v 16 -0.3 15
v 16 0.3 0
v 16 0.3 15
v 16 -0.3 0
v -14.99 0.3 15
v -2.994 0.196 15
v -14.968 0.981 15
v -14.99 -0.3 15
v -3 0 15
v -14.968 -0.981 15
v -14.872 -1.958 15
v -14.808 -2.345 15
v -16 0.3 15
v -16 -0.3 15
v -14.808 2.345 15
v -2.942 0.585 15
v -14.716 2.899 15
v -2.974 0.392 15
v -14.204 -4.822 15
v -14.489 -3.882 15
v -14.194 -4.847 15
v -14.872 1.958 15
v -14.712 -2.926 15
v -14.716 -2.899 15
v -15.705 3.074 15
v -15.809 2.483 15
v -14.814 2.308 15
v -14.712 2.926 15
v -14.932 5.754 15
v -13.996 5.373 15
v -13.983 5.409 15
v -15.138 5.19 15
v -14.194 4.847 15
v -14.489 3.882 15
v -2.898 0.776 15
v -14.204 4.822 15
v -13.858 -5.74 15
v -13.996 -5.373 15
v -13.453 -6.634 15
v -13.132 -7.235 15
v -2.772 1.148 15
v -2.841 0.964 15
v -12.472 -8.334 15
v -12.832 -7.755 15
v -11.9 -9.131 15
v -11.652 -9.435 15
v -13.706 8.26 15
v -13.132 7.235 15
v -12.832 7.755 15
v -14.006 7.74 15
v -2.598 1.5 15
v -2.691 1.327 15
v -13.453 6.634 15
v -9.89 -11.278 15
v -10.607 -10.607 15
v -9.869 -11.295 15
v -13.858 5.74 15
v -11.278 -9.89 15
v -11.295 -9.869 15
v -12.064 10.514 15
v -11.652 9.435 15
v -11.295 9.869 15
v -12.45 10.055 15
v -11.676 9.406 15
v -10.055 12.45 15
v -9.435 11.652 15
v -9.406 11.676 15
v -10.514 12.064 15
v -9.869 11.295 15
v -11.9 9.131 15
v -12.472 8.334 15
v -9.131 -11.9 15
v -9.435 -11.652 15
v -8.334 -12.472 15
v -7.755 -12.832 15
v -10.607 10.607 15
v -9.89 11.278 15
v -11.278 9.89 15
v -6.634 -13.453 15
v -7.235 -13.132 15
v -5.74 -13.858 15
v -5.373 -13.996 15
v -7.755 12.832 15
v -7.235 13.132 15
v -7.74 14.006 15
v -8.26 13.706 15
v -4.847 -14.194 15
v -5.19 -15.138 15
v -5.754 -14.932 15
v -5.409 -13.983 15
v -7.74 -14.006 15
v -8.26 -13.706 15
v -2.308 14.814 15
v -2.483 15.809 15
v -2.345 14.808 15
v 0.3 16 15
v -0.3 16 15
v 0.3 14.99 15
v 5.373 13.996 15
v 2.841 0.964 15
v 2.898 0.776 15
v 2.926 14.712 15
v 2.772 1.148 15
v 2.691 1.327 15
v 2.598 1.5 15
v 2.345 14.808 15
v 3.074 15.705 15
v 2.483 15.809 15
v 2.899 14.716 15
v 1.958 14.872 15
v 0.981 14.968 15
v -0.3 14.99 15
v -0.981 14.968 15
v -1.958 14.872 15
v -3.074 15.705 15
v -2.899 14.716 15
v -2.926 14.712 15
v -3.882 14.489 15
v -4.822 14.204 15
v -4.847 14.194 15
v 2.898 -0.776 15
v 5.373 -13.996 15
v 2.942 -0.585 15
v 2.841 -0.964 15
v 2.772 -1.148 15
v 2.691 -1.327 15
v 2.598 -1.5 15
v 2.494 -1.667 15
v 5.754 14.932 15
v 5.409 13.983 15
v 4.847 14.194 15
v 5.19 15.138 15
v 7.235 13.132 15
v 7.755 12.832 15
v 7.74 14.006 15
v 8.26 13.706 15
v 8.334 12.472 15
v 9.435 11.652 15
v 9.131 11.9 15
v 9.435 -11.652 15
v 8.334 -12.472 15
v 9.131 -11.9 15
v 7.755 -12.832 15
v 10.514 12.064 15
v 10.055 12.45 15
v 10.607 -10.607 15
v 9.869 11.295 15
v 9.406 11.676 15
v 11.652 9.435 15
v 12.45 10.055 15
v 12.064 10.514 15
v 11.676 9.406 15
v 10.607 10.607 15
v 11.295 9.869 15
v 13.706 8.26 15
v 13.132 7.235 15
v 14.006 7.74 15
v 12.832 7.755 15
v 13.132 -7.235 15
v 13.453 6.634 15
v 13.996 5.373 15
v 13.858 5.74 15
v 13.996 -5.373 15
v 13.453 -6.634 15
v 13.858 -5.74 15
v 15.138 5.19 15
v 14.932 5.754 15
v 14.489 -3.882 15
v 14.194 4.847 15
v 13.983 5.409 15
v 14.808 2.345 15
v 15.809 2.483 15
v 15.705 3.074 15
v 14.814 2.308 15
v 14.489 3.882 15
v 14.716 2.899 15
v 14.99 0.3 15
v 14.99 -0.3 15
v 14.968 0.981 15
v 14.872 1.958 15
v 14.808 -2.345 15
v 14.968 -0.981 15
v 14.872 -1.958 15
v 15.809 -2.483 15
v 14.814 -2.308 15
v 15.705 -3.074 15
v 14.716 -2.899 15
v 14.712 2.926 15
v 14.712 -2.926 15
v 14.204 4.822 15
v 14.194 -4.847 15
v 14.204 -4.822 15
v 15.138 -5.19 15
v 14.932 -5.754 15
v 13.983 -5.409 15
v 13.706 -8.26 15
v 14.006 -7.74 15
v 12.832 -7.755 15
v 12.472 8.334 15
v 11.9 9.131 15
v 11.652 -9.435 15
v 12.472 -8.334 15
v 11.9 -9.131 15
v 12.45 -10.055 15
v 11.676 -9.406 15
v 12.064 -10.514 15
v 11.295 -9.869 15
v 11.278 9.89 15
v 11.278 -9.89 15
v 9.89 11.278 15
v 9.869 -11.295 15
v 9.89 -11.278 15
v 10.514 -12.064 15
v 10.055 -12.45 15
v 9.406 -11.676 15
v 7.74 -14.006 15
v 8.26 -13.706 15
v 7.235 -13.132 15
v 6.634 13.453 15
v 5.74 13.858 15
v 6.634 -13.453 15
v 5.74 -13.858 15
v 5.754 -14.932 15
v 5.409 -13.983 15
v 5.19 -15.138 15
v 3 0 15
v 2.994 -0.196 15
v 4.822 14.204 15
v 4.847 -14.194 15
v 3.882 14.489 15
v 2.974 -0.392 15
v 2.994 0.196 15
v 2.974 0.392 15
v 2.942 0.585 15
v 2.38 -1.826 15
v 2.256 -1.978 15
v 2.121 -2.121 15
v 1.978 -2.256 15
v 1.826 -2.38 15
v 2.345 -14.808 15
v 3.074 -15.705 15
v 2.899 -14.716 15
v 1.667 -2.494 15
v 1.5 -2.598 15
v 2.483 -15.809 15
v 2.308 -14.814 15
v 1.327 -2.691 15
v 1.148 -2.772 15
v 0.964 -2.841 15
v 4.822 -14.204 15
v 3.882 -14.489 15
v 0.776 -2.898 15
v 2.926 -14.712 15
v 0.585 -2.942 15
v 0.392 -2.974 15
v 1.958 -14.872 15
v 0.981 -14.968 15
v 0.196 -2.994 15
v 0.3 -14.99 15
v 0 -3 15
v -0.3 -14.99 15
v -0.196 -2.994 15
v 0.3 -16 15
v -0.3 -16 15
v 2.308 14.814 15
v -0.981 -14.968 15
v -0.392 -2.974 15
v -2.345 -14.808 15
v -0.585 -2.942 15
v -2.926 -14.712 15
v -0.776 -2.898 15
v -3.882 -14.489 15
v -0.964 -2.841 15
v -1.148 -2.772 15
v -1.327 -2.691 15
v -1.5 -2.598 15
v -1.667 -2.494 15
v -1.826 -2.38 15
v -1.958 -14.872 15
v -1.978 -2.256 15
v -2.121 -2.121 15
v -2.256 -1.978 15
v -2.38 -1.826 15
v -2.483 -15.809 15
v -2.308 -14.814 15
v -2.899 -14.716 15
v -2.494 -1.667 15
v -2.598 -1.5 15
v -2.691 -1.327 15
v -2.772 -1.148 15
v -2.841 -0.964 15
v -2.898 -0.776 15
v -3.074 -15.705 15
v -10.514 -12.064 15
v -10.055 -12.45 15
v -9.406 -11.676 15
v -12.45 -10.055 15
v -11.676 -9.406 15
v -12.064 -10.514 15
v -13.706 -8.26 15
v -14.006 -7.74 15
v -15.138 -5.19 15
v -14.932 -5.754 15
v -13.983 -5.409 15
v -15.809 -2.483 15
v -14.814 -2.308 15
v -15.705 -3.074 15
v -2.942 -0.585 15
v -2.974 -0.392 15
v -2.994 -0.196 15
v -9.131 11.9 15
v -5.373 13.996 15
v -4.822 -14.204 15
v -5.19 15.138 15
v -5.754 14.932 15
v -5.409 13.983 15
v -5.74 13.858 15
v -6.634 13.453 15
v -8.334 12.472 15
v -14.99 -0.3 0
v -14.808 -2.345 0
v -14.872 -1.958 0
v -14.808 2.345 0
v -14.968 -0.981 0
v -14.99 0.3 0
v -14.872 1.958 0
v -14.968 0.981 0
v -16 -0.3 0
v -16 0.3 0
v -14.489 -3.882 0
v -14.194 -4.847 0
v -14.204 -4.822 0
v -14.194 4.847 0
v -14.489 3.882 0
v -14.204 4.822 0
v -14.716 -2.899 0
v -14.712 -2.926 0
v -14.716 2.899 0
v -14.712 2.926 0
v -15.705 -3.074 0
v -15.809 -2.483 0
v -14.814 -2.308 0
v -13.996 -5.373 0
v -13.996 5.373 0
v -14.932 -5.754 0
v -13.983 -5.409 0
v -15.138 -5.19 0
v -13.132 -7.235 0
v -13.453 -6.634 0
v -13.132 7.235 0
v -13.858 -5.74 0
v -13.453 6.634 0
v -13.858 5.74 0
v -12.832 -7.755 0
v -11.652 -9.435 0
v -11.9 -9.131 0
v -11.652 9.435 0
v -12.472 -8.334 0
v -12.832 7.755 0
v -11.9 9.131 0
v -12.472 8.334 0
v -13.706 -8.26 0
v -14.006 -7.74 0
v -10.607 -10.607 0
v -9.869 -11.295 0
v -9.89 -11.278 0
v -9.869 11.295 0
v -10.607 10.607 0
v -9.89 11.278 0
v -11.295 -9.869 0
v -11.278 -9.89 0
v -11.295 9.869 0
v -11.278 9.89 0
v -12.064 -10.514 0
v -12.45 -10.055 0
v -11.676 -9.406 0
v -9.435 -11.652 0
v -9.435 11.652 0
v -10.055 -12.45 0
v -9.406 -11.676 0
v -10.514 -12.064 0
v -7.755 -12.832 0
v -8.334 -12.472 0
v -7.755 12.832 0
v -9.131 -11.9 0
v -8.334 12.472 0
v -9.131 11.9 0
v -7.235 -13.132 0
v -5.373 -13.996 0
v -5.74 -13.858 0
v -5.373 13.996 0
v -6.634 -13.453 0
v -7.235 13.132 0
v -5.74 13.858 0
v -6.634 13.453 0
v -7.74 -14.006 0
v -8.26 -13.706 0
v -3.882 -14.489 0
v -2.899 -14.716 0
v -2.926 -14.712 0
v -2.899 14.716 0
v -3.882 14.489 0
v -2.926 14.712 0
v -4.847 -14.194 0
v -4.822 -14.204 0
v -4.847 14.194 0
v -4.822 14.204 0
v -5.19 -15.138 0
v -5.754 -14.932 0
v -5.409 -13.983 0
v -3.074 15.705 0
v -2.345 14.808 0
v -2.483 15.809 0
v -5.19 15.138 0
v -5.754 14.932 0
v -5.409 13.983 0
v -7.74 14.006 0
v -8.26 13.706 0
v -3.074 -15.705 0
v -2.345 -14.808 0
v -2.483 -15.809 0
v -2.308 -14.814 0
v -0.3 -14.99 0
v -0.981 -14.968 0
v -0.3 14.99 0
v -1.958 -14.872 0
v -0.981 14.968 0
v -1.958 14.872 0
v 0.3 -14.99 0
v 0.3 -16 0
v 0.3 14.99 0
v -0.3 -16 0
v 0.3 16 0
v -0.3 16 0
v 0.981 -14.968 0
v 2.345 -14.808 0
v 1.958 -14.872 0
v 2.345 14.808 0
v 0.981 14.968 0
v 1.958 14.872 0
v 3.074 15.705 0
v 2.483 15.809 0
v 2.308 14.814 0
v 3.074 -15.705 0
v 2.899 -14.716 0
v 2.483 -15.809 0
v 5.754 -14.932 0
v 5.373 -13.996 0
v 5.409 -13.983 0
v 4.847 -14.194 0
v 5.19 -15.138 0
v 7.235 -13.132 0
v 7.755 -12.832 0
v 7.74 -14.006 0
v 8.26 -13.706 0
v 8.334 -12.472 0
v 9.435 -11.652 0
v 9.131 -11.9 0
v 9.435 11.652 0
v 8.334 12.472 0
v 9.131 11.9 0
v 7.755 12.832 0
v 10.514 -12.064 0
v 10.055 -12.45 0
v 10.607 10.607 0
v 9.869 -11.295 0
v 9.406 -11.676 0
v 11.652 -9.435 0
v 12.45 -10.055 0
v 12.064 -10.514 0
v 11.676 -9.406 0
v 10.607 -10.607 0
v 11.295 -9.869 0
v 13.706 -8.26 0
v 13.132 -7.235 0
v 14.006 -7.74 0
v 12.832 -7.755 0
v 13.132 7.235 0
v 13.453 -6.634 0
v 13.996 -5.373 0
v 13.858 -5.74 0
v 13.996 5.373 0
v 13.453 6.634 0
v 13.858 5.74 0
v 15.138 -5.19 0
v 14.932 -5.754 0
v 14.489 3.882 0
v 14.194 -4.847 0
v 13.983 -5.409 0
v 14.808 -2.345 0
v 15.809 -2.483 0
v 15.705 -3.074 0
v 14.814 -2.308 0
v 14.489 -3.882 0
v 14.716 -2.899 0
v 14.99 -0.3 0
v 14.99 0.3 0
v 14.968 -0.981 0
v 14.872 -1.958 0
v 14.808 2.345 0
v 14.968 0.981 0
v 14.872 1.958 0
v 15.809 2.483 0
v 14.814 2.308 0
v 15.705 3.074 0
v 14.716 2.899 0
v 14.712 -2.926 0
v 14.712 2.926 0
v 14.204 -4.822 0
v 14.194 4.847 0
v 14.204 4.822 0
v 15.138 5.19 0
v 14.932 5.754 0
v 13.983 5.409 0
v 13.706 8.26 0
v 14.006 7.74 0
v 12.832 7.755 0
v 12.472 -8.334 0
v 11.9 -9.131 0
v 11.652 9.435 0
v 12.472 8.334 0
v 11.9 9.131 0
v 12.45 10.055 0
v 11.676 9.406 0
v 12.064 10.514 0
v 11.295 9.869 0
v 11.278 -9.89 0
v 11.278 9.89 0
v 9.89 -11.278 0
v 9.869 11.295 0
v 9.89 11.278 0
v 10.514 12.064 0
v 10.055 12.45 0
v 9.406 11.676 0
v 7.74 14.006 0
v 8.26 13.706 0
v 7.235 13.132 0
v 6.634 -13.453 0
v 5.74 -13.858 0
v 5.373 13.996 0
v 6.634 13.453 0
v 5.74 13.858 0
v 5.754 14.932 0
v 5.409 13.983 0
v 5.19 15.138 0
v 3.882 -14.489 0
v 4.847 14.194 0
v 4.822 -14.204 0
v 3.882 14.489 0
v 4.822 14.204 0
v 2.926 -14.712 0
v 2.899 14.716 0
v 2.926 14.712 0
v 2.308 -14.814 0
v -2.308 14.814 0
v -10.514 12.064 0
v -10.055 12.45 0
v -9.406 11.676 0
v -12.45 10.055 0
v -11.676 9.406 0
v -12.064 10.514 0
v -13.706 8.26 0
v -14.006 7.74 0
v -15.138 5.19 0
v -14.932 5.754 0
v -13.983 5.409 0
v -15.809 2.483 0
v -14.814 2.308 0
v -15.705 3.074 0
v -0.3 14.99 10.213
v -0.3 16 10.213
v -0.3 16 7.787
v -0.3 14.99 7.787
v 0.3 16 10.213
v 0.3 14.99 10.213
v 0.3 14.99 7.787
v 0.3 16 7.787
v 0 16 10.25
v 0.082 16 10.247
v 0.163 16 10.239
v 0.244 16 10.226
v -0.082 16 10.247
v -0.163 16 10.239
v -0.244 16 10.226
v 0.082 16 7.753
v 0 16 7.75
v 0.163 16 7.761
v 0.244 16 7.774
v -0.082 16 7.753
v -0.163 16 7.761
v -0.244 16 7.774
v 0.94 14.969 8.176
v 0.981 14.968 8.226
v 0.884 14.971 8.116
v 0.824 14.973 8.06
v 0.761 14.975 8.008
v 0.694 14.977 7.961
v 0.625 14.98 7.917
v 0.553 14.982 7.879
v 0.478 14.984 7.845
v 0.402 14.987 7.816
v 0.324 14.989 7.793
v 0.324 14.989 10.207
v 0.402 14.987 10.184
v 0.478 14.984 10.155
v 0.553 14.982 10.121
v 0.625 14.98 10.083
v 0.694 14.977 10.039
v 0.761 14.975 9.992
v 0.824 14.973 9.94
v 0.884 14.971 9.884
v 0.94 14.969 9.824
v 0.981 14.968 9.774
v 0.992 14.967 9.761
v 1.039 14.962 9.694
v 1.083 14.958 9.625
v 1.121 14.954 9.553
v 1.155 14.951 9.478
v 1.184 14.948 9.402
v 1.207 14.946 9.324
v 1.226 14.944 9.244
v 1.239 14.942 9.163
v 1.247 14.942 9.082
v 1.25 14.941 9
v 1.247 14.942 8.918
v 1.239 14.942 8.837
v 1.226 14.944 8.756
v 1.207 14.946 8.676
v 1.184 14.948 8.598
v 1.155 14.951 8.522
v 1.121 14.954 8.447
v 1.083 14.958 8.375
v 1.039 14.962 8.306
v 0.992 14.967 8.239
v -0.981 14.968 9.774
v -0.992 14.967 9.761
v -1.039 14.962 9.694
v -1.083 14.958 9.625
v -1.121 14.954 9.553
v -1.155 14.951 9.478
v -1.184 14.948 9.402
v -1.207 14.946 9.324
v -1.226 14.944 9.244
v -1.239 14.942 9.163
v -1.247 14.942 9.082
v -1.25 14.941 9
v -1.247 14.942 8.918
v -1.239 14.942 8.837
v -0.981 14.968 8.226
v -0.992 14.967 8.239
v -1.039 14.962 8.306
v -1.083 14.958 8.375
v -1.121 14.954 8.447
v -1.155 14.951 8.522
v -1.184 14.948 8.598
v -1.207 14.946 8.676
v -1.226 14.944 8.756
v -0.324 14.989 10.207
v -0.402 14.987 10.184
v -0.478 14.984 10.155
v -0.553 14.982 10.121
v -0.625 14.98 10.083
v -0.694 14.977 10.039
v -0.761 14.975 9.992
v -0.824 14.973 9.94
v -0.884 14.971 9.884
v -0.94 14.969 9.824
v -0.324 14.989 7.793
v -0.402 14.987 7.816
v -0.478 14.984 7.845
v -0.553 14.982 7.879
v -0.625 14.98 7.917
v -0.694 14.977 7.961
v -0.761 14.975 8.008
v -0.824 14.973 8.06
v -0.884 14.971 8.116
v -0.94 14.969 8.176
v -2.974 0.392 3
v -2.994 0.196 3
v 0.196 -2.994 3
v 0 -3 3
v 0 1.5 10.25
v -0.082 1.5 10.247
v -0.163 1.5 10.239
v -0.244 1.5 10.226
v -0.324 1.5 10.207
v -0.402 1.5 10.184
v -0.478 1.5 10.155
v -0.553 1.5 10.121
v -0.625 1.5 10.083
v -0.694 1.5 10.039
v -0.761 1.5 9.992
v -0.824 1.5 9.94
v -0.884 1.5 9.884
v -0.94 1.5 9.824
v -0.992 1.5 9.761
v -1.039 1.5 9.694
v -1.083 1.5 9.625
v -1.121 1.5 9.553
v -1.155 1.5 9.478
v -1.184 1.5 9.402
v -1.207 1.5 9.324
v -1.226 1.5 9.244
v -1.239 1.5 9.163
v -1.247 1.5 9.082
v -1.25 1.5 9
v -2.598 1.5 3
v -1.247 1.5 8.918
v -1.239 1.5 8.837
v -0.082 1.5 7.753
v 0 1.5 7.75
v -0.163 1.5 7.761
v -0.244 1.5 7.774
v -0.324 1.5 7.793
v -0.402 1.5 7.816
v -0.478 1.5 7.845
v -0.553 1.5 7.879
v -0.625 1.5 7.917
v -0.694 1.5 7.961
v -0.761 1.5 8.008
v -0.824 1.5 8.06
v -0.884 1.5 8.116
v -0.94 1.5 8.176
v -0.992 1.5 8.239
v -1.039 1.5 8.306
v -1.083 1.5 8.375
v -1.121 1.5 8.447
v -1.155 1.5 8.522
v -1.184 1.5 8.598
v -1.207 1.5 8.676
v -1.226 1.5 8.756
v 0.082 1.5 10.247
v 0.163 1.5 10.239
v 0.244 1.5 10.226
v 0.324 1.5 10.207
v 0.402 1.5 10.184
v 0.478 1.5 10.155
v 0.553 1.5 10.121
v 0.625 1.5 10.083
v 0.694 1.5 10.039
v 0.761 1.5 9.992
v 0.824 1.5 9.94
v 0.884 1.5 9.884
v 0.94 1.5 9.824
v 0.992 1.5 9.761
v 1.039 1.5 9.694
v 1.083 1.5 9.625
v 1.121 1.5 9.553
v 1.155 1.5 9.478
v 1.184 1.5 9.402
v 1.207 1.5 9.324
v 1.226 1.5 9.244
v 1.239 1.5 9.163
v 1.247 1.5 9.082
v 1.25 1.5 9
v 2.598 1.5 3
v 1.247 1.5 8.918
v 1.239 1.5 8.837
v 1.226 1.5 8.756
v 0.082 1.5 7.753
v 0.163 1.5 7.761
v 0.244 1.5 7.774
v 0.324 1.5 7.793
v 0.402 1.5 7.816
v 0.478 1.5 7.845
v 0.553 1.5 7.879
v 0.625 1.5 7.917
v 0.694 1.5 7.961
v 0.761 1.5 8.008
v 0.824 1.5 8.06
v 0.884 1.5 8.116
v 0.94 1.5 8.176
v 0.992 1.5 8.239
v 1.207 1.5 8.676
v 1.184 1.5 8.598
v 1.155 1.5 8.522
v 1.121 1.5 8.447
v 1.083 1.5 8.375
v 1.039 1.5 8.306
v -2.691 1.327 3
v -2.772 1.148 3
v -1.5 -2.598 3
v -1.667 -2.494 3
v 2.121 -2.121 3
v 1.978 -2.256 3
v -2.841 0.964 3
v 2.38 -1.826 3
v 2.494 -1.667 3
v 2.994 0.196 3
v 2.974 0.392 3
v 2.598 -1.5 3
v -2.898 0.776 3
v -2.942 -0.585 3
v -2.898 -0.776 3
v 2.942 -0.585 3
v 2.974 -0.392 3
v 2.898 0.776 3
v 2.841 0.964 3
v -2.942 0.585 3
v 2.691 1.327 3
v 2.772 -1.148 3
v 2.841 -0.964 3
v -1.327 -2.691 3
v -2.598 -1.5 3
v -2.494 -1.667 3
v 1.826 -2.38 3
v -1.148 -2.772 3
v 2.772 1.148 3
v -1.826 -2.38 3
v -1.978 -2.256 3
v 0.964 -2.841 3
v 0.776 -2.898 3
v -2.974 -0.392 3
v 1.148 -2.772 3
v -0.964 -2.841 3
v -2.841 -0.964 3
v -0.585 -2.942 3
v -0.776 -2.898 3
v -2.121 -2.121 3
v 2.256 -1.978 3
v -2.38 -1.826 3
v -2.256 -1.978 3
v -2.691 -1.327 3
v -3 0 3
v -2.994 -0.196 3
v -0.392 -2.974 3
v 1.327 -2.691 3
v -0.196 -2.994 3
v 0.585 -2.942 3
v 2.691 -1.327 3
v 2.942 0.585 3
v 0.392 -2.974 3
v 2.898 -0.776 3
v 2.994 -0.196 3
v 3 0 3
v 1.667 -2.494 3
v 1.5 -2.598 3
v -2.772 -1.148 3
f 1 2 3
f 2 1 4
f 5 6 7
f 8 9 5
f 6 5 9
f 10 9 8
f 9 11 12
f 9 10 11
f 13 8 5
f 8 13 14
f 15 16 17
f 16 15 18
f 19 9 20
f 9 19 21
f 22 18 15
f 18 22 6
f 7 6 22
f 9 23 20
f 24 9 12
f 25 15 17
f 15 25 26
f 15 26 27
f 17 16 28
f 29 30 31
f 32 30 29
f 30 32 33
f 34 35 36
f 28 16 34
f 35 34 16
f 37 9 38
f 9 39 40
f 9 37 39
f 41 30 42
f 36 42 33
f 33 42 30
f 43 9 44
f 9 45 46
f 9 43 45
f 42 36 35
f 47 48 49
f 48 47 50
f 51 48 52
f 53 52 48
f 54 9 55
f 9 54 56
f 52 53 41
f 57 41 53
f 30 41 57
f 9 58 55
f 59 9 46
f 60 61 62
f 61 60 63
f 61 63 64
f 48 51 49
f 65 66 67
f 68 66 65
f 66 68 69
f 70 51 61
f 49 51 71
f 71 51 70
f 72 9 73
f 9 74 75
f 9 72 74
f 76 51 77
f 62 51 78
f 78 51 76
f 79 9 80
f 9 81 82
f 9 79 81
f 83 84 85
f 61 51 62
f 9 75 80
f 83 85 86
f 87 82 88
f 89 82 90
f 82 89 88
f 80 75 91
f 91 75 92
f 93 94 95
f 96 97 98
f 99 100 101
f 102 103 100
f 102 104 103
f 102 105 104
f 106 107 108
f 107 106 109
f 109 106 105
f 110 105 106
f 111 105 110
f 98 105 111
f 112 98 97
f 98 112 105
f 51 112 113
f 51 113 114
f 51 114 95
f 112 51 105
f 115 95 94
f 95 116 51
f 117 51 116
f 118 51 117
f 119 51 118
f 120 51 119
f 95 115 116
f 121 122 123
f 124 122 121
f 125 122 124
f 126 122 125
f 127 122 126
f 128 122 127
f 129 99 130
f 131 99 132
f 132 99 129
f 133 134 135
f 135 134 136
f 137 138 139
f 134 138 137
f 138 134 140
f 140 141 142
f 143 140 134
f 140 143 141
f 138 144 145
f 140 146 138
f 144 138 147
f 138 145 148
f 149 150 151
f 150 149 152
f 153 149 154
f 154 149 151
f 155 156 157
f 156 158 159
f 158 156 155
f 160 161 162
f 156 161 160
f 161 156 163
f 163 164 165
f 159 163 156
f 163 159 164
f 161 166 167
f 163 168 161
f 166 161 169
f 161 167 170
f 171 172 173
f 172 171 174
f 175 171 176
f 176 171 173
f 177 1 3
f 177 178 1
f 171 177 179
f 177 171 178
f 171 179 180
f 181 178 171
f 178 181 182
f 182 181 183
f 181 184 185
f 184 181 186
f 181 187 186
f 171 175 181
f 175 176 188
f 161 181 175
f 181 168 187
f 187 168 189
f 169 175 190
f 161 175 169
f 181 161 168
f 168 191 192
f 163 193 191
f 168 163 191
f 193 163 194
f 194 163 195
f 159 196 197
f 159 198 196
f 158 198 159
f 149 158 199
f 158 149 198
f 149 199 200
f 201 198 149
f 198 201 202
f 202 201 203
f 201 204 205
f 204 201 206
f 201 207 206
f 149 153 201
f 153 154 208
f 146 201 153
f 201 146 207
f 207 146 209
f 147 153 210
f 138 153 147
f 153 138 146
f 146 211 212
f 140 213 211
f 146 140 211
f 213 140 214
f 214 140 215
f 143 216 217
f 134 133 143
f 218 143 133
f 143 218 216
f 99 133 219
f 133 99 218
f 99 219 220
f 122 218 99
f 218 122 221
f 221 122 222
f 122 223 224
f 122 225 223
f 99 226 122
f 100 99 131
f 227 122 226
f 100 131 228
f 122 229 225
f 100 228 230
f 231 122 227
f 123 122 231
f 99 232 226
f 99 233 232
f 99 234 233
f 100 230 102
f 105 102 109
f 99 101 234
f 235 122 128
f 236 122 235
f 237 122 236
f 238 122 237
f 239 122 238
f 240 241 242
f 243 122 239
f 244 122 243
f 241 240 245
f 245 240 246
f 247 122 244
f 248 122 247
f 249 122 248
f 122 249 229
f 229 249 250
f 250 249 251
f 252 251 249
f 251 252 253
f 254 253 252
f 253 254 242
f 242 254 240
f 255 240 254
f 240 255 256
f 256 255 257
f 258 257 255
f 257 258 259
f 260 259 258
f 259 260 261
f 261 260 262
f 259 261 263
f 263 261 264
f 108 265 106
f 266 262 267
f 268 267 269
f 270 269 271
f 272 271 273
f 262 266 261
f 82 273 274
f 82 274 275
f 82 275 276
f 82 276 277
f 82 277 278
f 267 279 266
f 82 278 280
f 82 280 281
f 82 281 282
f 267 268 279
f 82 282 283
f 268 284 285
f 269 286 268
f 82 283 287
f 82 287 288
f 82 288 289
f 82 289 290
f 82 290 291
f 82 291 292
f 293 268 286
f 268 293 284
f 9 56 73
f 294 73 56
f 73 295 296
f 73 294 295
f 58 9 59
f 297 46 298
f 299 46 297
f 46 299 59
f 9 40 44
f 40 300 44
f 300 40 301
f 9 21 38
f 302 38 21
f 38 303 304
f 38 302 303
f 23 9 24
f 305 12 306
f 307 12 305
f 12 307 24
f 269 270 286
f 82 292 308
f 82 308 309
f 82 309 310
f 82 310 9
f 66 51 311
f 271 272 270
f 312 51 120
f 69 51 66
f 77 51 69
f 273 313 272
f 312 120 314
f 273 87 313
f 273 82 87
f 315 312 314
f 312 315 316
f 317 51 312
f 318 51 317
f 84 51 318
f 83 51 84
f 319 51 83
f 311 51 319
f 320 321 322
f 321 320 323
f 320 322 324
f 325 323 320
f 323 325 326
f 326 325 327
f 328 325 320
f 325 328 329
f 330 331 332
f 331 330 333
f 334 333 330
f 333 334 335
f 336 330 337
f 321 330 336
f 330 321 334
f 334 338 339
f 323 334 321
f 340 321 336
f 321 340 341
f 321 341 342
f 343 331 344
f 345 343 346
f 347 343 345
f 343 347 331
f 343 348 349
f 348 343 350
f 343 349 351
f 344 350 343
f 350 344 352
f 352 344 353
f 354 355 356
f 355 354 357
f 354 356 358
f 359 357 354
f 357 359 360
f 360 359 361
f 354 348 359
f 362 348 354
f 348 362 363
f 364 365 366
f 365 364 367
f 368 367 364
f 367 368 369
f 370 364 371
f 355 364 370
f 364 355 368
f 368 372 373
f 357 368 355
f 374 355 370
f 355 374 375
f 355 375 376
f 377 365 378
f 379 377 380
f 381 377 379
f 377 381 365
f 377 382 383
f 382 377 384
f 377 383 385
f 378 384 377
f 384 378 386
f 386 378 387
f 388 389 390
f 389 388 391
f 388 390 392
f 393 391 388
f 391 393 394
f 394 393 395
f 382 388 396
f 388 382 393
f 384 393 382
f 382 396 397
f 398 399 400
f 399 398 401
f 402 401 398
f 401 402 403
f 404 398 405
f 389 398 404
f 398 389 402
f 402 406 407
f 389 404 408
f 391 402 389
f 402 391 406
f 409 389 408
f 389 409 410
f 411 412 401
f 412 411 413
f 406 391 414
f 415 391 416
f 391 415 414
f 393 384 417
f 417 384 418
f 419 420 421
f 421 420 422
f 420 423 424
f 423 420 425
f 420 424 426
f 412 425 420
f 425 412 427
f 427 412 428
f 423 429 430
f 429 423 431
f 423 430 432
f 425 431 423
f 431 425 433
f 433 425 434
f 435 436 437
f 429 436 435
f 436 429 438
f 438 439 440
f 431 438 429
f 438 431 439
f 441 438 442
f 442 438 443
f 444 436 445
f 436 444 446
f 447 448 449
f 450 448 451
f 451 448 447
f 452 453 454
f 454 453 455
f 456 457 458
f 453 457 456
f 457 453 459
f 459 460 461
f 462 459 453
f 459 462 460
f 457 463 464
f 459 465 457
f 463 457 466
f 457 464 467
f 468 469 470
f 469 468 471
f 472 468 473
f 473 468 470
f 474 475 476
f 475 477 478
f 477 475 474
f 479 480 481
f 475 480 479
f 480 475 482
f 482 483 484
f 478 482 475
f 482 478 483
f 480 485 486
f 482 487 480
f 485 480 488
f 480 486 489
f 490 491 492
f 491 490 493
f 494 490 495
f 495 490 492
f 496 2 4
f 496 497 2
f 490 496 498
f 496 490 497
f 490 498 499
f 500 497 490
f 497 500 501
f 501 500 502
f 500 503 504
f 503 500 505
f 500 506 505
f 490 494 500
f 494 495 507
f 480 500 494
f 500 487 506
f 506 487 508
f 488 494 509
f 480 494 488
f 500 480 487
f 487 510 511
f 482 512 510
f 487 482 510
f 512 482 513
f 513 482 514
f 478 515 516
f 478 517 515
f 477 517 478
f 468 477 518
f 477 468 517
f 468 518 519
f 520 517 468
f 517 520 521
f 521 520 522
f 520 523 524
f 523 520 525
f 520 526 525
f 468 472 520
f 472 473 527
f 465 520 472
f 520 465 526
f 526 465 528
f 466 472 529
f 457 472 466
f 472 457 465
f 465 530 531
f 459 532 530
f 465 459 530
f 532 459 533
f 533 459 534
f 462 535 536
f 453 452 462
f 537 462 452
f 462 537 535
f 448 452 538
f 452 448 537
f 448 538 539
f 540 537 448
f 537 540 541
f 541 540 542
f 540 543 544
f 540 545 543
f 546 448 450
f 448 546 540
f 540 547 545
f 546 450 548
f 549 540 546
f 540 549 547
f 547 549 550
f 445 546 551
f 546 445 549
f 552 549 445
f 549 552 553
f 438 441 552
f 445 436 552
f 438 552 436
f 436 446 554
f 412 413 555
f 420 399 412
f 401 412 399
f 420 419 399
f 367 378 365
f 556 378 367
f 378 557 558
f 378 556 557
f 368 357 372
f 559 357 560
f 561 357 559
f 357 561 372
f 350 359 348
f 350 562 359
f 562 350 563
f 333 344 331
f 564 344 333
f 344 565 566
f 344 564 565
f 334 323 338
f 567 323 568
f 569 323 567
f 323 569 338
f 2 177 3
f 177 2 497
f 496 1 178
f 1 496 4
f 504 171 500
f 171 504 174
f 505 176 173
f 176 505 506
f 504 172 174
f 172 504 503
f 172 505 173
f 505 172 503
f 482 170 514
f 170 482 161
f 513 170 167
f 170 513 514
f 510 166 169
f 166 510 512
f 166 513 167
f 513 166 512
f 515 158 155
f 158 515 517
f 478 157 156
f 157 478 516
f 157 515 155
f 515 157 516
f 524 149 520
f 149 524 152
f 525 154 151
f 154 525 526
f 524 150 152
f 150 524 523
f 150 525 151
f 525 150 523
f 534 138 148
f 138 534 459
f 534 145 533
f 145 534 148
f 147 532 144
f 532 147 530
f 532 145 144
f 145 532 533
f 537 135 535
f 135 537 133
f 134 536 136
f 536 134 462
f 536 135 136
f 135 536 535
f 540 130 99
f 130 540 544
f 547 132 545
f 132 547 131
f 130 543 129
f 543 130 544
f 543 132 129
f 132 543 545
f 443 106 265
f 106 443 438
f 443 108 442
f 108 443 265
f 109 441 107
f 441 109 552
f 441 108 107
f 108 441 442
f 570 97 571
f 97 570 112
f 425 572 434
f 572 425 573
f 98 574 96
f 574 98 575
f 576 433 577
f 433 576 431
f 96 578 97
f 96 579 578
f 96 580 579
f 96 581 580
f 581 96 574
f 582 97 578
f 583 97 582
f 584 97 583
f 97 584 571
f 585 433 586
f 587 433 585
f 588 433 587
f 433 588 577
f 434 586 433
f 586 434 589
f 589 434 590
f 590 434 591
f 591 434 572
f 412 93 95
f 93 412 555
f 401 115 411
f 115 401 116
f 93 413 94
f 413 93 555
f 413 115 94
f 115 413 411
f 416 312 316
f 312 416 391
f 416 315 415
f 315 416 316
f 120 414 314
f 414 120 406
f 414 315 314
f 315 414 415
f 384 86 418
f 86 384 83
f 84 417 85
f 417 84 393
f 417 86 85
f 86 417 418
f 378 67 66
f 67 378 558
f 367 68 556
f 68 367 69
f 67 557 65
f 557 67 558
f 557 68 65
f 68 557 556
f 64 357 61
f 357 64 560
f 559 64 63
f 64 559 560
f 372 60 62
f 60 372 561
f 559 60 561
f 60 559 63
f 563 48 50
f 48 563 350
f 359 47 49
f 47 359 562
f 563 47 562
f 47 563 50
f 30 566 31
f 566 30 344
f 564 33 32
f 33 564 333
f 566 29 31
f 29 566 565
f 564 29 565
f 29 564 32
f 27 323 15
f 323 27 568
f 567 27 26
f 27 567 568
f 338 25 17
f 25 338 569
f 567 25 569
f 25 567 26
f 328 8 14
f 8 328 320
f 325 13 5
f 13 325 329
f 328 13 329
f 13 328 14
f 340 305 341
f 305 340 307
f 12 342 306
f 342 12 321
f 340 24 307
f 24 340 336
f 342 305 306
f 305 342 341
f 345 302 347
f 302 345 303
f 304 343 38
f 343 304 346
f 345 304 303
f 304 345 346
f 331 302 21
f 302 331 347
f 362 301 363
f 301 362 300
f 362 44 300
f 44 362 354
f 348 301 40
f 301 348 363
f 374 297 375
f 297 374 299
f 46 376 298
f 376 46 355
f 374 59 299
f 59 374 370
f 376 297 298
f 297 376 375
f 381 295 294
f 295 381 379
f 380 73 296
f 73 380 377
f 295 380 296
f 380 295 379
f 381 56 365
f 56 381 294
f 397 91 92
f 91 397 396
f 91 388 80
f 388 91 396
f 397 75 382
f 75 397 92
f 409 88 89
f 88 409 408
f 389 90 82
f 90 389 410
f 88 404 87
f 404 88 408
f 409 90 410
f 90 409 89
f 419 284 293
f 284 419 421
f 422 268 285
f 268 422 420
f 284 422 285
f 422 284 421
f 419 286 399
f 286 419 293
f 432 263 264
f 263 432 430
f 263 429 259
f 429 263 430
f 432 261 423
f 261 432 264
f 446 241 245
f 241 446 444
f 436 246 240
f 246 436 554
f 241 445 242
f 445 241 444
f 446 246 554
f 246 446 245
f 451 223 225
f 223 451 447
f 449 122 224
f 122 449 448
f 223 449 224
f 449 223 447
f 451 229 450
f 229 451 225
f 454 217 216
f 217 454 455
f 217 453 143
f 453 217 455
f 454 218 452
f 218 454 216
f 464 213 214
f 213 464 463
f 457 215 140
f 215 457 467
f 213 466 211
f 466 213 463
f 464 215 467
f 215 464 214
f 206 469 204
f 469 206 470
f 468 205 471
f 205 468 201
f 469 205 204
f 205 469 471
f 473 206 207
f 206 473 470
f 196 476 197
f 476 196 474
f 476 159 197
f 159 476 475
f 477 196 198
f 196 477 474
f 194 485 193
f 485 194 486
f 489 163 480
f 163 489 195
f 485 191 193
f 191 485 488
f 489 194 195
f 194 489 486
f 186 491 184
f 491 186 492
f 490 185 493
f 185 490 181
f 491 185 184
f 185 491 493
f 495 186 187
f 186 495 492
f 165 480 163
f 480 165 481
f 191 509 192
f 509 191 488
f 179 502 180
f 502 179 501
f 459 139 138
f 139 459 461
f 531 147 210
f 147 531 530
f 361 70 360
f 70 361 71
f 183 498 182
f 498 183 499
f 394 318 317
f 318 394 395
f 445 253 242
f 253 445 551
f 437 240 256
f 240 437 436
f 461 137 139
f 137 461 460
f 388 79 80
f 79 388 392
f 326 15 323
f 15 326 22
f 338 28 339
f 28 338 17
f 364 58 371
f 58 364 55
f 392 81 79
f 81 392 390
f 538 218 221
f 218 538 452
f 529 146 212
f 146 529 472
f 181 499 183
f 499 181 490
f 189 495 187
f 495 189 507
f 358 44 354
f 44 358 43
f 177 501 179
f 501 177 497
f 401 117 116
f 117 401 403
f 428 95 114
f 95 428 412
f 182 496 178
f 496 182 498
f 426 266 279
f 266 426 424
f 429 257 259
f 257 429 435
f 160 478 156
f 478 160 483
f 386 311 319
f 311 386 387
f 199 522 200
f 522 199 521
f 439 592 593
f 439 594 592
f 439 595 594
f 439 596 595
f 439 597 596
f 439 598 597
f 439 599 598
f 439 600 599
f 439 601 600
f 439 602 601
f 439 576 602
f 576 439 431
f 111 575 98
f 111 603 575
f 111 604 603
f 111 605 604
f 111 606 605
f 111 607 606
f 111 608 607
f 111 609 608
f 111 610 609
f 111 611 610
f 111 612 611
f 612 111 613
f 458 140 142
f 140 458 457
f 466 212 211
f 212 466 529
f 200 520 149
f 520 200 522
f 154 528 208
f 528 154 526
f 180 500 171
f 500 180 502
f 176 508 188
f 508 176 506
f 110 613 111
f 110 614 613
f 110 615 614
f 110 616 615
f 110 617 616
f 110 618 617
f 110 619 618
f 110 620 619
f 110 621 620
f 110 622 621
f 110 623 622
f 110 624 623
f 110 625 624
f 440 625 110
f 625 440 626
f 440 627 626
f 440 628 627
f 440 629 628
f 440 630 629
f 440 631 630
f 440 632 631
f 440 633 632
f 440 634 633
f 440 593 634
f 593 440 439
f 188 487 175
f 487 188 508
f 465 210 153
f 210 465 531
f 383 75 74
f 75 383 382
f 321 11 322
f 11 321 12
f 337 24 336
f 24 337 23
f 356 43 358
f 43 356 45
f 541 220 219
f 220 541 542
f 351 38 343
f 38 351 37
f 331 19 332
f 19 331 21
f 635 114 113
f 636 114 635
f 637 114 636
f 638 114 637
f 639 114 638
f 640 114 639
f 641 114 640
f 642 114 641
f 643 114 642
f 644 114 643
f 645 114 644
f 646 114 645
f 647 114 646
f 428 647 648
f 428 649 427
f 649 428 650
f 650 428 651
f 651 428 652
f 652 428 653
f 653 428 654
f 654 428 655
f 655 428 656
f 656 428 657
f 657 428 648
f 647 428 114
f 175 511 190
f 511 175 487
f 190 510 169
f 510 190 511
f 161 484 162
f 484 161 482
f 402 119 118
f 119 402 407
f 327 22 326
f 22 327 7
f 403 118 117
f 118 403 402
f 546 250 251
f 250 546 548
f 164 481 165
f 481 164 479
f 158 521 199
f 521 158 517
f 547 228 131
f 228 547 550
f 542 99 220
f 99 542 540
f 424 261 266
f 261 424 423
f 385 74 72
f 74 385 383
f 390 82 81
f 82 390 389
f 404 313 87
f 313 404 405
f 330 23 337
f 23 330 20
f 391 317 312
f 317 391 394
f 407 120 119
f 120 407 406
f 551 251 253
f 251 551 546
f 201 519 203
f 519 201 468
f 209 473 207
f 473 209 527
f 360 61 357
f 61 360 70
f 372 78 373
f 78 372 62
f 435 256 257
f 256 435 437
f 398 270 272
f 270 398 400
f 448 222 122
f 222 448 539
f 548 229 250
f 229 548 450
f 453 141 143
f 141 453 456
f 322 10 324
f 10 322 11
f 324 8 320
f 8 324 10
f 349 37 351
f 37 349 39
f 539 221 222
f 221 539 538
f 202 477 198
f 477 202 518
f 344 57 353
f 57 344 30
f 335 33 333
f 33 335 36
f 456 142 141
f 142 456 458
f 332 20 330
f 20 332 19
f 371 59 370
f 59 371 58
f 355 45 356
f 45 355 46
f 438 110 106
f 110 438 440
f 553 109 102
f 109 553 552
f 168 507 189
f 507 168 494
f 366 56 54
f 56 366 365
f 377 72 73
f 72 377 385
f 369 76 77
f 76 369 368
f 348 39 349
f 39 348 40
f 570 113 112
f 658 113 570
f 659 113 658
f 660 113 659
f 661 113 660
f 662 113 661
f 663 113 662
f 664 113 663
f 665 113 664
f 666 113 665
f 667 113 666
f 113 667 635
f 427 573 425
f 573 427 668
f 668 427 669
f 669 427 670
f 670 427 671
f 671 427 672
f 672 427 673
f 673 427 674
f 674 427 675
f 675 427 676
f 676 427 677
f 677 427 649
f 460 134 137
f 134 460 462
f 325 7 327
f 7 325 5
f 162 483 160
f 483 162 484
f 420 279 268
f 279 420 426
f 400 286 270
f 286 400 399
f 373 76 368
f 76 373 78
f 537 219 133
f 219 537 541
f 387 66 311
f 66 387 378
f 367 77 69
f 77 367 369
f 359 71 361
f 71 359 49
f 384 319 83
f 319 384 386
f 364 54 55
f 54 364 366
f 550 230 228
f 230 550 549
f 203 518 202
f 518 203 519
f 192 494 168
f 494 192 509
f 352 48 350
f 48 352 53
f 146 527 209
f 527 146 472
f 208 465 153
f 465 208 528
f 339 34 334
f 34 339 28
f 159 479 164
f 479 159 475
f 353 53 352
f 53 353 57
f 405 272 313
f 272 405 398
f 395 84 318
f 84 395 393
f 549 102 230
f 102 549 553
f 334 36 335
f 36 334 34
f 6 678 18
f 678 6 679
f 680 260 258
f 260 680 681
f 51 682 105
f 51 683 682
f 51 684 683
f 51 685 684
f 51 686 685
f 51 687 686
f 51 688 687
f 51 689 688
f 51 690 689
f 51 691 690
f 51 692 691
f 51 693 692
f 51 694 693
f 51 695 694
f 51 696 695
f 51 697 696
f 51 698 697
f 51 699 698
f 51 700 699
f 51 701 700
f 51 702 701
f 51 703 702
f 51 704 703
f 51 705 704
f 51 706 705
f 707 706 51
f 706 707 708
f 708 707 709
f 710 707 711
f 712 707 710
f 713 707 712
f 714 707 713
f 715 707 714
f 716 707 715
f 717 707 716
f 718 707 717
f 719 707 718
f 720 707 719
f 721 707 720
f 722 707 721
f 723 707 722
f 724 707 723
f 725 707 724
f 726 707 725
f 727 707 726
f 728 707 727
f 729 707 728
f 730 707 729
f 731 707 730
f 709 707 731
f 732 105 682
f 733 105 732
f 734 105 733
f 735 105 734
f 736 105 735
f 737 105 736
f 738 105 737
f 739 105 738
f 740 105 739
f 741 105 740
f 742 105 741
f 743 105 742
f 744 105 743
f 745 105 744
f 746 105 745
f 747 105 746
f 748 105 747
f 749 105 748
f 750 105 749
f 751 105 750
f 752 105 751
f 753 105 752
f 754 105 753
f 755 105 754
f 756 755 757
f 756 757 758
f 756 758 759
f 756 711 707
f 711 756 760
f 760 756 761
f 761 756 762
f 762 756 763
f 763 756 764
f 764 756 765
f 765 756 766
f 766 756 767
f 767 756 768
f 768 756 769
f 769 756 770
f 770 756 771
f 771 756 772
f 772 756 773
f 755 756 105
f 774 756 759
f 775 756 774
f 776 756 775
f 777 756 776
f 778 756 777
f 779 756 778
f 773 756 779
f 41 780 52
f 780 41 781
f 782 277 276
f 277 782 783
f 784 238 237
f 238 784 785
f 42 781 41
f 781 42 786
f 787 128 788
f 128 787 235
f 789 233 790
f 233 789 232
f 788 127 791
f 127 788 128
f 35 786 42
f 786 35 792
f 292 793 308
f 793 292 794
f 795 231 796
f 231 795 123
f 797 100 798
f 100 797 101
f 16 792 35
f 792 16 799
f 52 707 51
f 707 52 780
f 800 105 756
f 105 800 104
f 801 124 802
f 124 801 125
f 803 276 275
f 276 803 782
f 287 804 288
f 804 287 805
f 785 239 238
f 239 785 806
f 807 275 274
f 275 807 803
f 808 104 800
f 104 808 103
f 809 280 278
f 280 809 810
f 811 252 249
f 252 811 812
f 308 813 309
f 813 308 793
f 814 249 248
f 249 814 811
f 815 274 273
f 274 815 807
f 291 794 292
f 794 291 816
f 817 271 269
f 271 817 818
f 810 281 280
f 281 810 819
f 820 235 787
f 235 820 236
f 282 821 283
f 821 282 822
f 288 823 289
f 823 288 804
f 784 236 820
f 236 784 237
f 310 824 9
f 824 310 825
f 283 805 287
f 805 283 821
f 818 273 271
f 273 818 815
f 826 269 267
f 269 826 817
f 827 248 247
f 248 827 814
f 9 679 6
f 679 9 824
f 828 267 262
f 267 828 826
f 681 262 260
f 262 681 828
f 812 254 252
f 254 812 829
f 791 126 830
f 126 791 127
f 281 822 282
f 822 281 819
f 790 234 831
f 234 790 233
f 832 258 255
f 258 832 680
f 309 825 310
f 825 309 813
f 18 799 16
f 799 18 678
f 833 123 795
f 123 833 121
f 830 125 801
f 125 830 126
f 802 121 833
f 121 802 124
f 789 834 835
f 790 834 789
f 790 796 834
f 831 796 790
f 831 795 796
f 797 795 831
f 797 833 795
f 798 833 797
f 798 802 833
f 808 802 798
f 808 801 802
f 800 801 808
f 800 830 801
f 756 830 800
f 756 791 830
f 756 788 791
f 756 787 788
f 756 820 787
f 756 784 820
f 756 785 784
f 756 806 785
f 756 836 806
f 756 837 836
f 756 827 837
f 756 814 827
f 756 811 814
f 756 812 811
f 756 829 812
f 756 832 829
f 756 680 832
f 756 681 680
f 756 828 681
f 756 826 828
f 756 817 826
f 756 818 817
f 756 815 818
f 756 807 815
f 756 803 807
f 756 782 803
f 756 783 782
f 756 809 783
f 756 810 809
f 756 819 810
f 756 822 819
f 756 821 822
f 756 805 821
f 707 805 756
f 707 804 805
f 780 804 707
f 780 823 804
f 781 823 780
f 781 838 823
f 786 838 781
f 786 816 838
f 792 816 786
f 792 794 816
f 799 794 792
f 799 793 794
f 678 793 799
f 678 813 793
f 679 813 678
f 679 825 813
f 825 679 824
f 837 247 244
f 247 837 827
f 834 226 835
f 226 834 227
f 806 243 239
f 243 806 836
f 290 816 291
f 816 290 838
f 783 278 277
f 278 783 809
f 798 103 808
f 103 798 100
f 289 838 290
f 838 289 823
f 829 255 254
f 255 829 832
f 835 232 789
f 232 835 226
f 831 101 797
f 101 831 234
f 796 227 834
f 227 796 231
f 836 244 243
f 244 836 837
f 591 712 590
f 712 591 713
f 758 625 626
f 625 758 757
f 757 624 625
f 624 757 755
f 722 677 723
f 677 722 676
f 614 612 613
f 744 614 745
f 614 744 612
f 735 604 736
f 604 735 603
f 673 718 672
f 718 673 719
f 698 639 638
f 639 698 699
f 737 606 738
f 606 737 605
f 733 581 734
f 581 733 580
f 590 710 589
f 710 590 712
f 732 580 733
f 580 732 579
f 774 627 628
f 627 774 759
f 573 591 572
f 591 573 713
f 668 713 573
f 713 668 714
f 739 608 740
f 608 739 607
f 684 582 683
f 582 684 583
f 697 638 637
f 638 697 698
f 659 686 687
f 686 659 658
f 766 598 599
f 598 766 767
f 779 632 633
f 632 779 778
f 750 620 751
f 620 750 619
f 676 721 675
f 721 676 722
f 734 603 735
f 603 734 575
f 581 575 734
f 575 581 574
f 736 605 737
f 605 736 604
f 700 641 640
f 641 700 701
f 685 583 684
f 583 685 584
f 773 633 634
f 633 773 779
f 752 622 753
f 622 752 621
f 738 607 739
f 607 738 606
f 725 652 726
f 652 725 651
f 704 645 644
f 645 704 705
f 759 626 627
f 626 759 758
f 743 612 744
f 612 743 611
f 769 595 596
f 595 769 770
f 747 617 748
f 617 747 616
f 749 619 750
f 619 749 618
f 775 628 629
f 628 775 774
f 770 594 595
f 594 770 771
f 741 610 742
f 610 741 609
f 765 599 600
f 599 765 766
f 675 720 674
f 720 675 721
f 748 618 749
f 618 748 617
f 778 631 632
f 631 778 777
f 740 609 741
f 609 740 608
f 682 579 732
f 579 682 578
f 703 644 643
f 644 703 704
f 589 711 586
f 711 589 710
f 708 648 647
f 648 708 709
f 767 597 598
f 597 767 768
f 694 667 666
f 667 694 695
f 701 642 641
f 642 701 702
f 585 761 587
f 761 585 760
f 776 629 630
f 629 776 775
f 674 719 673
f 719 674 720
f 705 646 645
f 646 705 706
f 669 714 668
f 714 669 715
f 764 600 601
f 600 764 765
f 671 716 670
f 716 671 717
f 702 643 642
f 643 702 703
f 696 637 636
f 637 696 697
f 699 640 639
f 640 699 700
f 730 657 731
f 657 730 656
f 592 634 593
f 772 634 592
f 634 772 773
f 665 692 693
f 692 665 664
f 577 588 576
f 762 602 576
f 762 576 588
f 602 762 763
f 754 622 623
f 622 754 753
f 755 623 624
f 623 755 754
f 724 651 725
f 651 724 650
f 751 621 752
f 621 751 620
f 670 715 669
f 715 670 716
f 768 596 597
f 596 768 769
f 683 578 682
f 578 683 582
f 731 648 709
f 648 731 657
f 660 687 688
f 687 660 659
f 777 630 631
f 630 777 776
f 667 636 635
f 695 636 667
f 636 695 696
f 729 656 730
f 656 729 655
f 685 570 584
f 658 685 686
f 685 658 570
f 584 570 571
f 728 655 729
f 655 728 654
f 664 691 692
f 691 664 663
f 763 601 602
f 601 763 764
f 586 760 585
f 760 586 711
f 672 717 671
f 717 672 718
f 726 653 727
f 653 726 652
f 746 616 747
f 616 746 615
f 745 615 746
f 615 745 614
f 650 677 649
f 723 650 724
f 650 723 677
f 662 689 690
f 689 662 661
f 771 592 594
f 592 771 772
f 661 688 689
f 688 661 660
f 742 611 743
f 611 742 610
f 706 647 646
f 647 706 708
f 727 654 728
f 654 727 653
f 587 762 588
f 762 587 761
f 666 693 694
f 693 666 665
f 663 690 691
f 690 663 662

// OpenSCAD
// === DESCRIPTION ===
// Control knob: a 30 mm knob for a 6 mm D-shaft potentiometer on an amplifier
// front panel. It pushes onto the shaft and an M3 grub screw bearing on the shaft's
// flat stops it pulling off.
// Physical context: indoors; the knob is turned by hand, so torque is small but
//   it is fitted and removed whenever the panel is serviced.
//
// Design decisions:
//   - Printed with the knob's top face on the bed, so the face you touch is the
//     smooth bed side and the bore opens upward with no overhang.
//   - A D-shaped bore transmits the torque; the grub screw only retains the knob.
//   - Fine ribs round the skirt give grip.
//
// Terminology → code:
//   "knob"        → knob_d, knob_h, knob_body()
//   "bore"        → shaft_d, shaft_flat, bore_depth, d_bore()
//   "grub screw"  → grub_pilot_d, grub_z, grub_hole()
//   "grip ribs"   → rib_n, rib_w, rib_h, ribs()
//
// Common modifications:
//   Other shaft   → shaft_d, shaft_flat
//   Bigger knob   → knob_d, rib_n
//
// Overall dimensions: 32 x 32 x 15 mm (fits a Bambu P1S, 256^3)
// Coordinate system: Z = up from the knob's top face (upside down as printed)
// NOTE: Model is in print orientation; in use it is flipped over.

// === PRINT SETTINGS ===
// Material: PLA
// Layer Height: 0.16mm
// Walls/Perimeters: 3
// Infill: 50% gyroid
// Supports: None required
// Orientation: As modeled, knob top face on the bed
// Notes: Thread the M3 grub screw into the pilot hole

// === PARAMETERS ===
nozzle_diameter = 0.4;
layer_height = 0.16;

knob_d = 30;          // knob body diameter
knob_h = 15;          // knob height
shaft_d = 6.0;        // D-shaft diameter
shaft_flat = 4.5;     // D-shaft size across the flat
bore_depth = 12;      // bore depth from the open end
grub_pilot_d = 2.5;   // pilot hole the M3 grub screw threads into
grub_z = 9;           // grub screw height (print Z)
rib_n = 36;           // number of grip ribs
rib_w = 0.6;          // rib width
rib_h = 1.0;          // rib height above the body

// === DERIVED CONSTANTS ===
fudge = 0.01;
$fn = $preview ? 48 : 96;

assert(bore_depth < knob_h - 2, "at least 2 mm of solid top");
assert(grub_z > knob_h - bore_depth, "grub screw meets the bore");

// === MODULES ===
module d_bore()
    translate([0, 0, knob_h - bore_depth])
        linear_extrude(bore_depth + fudge)
            intersection() {
                circle(d = shaft_d);
                translate([-shaft_d / 2, -shaft_d / 2]) square([shaft_d, shaft_flat]);
            }

module knob_body() cylinder(d = knob_d, h = knob_h);

module ribs()
    for (i = [0 : rib_n - 1])
        rotate([0, 0, i * 360 / rib_n])
            translate([knob_d / 2 - fudge, -rib_w / 2, 0]) cube([rib_h + fudge, rib_w, knob_h]);

module grub_hole()
    translate([0, 0, grub_z]) rotate([-90, 0, 0]) cylinder(d = grub_pilot_d, h = knob_d);

// === ASSEMBLY / RENDER ===
difference() {
    union() { knob_body(); ribs(); }
    d_bore();
    grub_hole();
}
